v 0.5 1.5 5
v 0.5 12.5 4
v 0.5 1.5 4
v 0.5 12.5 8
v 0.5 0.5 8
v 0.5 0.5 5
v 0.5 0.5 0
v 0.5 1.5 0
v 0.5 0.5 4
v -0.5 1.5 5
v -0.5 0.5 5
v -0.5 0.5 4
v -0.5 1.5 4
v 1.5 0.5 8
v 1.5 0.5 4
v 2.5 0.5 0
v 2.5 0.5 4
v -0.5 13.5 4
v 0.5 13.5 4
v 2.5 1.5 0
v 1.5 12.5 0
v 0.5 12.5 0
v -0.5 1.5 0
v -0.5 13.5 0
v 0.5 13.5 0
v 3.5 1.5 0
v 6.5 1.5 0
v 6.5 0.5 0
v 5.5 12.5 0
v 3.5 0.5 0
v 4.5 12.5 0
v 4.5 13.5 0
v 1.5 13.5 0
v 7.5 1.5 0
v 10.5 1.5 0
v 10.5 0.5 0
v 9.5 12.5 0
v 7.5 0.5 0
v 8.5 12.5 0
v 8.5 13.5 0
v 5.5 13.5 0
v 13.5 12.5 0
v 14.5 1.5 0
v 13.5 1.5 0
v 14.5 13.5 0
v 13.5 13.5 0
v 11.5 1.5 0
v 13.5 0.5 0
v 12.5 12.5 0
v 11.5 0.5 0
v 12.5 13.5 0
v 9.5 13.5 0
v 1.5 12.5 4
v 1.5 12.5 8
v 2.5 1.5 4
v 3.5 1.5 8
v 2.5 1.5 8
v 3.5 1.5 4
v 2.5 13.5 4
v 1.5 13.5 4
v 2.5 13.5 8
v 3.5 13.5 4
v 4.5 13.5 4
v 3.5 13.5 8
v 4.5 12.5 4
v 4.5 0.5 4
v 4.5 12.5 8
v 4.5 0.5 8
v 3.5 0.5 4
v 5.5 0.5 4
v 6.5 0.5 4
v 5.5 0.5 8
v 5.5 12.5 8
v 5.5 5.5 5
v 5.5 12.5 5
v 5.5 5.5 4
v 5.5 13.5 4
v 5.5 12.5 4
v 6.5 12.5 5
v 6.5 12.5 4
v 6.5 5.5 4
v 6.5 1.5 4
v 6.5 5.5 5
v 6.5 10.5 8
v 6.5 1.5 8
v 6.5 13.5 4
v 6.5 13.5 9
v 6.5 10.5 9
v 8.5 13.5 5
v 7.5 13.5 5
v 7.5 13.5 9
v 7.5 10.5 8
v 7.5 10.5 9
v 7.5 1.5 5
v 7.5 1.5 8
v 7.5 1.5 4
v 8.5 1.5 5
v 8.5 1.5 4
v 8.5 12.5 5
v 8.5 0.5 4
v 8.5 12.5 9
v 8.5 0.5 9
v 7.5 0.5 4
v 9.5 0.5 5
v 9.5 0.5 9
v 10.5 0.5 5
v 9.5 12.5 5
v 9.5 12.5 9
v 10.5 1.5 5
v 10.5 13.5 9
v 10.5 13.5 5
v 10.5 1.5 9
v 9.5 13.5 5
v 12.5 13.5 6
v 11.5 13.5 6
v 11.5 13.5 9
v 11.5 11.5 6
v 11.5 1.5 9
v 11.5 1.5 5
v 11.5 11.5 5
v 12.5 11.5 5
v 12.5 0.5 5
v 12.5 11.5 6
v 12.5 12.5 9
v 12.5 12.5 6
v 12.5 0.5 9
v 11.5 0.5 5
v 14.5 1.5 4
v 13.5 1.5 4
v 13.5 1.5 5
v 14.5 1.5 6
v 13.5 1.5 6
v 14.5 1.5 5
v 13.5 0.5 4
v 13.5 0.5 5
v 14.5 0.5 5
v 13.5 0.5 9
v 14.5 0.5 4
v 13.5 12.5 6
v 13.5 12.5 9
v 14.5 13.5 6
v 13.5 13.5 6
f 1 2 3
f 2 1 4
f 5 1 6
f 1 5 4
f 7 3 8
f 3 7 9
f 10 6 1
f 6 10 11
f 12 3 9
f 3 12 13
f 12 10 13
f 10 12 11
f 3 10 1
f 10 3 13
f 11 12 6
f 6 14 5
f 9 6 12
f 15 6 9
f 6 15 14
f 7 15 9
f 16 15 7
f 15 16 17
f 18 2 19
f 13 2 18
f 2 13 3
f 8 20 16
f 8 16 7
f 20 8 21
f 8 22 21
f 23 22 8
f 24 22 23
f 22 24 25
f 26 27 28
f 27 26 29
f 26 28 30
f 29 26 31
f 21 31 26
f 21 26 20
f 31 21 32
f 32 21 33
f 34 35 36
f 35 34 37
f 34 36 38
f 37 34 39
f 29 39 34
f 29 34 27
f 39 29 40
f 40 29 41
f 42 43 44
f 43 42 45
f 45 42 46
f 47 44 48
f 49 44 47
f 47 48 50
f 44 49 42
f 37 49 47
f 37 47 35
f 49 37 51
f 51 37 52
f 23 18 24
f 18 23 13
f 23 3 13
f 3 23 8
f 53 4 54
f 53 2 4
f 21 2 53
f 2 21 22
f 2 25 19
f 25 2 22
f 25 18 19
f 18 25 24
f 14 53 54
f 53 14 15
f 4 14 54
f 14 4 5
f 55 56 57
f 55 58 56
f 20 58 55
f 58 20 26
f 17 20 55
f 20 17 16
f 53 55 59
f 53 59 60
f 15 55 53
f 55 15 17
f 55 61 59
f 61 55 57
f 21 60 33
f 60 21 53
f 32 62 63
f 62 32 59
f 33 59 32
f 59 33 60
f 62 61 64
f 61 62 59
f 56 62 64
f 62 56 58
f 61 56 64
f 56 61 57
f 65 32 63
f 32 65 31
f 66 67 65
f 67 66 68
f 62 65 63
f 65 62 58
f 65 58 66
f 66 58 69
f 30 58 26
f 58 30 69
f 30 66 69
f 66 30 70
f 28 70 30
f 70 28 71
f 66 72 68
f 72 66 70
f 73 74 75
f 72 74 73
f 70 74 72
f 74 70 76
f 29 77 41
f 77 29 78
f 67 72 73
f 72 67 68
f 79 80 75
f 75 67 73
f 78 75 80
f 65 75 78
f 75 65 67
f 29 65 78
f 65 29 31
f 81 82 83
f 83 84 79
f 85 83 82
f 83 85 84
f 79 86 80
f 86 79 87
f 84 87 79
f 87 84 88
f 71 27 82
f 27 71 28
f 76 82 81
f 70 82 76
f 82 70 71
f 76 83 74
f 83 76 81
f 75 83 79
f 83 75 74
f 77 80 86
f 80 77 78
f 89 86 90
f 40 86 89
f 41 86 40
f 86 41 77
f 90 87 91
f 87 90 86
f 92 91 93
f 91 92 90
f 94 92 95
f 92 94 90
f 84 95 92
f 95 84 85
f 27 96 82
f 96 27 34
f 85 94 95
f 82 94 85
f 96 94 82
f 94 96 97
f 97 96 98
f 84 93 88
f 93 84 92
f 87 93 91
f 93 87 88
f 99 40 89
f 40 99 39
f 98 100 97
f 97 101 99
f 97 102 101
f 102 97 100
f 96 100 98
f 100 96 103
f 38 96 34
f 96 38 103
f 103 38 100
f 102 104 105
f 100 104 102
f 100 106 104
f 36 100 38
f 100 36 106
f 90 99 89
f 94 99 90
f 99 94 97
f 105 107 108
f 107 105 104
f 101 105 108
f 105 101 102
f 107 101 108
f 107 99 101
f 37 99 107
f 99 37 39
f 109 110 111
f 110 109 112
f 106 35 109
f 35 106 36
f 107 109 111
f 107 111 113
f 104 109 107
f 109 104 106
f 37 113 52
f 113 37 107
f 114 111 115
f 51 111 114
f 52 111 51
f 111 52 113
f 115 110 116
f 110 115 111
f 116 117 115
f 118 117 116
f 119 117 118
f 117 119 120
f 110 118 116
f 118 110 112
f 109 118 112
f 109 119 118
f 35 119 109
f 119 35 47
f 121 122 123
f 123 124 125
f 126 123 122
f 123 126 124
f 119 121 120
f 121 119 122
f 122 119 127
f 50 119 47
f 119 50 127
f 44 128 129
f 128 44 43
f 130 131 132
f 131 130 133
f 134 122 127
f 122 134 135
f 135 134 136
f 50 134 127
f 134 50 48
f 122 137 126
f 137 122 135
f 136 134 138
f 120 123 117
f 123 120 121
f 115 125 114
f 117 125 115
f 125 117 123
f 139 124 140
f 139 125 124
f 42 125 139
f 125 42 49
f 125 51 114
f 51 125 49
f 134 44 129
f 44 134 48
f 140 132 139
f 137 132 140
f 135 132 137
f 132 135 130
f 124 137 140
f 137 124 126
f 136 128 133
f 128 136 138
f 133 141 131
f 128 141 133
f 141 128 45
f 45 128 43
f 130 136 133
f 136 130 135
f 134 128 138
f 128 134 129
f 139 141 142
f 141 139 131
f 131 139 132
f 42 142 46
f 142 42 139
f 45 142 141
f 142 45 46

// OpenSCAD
union() {
    translate([0, 1, 4.5]) color([1, 0, 0]) cube([1, 1, 1], center=true);
    translate([0, 2, 2.0]) cube([1, 1, 4], center=true);
    translate([0, 3, 2.0]) cube([1, 1, 4], center=true);
    translate([0, 4, 2.0]) cube([1, 1, 4], center=true);
    translate([0, 5, 2.0]) cube([1, 1, 4], center=true);
    translate([0, 6, 2.0]) cube([1, 1, 4], center=true);
    translate([0, 7, 2.0]) cube([1, 1, 4], center=true);
    translate([0, 8, 2.0]) cube([1, 1, 4], center=true);
    translate([0, 9, 2.0]) cube([1, 1, 4], center=true);
    translate([0, 10, 2.0]) cube([1, 1, 4], center=true);
    translate([0, 11, 2.0]) cube([1, 1, 4], center=true);
    translate([0, 12, 2.0]) cube([1, 1, 4], center=true);
    translate([0, 13, 2.0]) cube([1, 1, 4], center=true);
    translate([1, 1, 4.0]) cube([1, 1, 8], center=true);
    translate([1, 2, 4.0]) cube([1, 1, 8], center=true);
    translate([1, 3, 4.0]) cube([1, 1, 8], center=true);
    translate([1, 4, 4.0]) cube([1, 1, 8], center=true);
    translate([1, 5, 4.0]) cube([1, 1, 8], center=true);
    translate([1, 6, 4.0]) cube([1, 1, 8], center=true);
    translate([1, 7, 4.0]) cube([1, 1, 8], center=true);
    translate([1, 8, 4.0]) cube([1, 1, 8], center=true);
    translate([1, 9, 4.0]) cube([1, 1, 8], center=true);
    translate([1, 10, 4.0]) cube([1, 1, 8], center=true);
    translate([1, 11, 4.0]) cube([1, 1, 8], center=true);
    translate([1, 12, 4.0]) cube([1, 1, 8], center=true);
    translate([2, 1, 2.0]) cube([1, 1, 4], center=true);
    translate([2, 2, 2.0]) cube([1, 1, 4], center=true);
    translate([2, 3, 2.0]) cube([1, 1, 4], center=true);
    translate([2, 4, 2.0]) cube([1, 1, 4], center=true);
    translate([2, 5, 2.0]) cube([1, 1, 4], center=true);
    translate([2, 6, 2.0]) cube([1, 1, 4], center=true);
    translate([2, 7, 2.0]) cube([1, 1, 4], center=true);
    translate([2, 8, 2.0]) cube([1, 1, 4], center=true);
    translate([2, 9, 2.0]) cube([1, 1, 4], center=true);
    translate([2, 10, 2.0]) cube([1, 1, 4], center=true);
    translate([2, 11, 2.0]) cube([1, 1, 4], center=true);
    translate([2, 12, 2.0]) cube([1, 1, 4], center=true);
    translate([2, 13, 2.0]) cube([1, 1, 4], center=true);
    translate([3, 2, 4.0]) cube([1, 1, 8], center=true);
    translate([3, 3, 4.0]) cube([1, 1, 8], center=true);
    translate([3, 4, 4.0]) cube([1, 1, 8], center=true);
    translate([3, 5, 4.0]) cube([1, 1, 8], center=true);
    translate([3, 6, 4.0]) cube([1, 1, 8], center=true);
    translate([3, 7, 4.0]) cube([1, 1, 8], center=true);
    translate([3, 8, 4.0]) cube([1, 1, 8], center=true);
    translate([3, 9, 4.0]) cube([1, 1, 8], center=true);
    translate([3, 10, 4.0]) cube([1, 1, 8], center=true);
    translate([3, 11, 4.0]) cube([1, 1, 8], center=true);
    translate([3, 12, 4.0]) cube([1, 1, 8], center=true);
    translate([3, 13, 4.0]) cube([1, 1, 8], center=true);
    translate([4, 1, 2.0]) cube([1, 1, 4], center=true);
    translate([4, 2, 2.0]) cube([1, 1, 4], center=true);
    translate([4, 3, 2.0]) cube([1, 1, 4], center=true);
    translate([4, 4, 2.0]) cube([1, 1, 4], center=true);
    translate([4, 5, 2.0]) cube([1, 1, 4], center=true);
    translate([4, 6, 2.0]) cube([1, 1, 4], center=true);
    translate([4, 7, 2.0]) cube([1, 1, 4], center=true);
    translate([4, 8, 2.0]) cube([1, 1, 4], center=true);
    translate([4, 9, 2.0]) cube([1, 1, 4], center=true);
    translate([4, 10, 2.0]) cube([1, 1, 4], center=true);
    translate([4, 11, 2.0]) cube([1, 1, 4], center=true);
    translate([4, 12, 2.0]) cube([1, 1, 4], center=true);
    translate([4, 13, 2.0]) cube([1, 1, 4], center=true);
    translate([5, 1, 4.0]) cube([1, 1, 8], center=true);
    translate([5, 2, 4.0]) cube([1, 1, 8], center=true);
    translate([5, 3, 4.0]) cube([1, 1, 8], center=true);
    translate([5, 4, 4.0]) cube([1, 1, 8], center=true);
    translate([5, 5, 4.0]) cube([1, 1, 8], center=true);
    translate([5, 6, 4.0]) cube([1, 1, 8], center=true);
    translate([5, 7, 4.0]) cube([1, 1, 8], center=true);
    translate([5, 8, 4.0]) cube([1, 1, 8], center=true);
    translate([5, 9, 4.0]) cube([1, 1, 8], center=true);
    translate([5, 10, 4.0]) cube([1, 1, 8], center=true);
    translate([5, 11, 4.0]) cube([1, 1, 8], center=true);
    translate([5, 12, 4.0]) cube([1, 1, 8], center=true);
    translate([6, 1, 2.0]) cube([1, 1, 4], center=true);
    translate([6, 2, 2.0]) cube([1, 1, 4], center=true);
    translate([6, 3, 2.0]) cube([1, 1, 4], center=true);
    translate([6, 4, 2.0]) cube([1, 1, 4], center=true);
    translate([6, 5, 2.0]) cube([1, 1, 4], center=true);
    translate([6, 6, 2.5]) cube([1, 1, 5], center=true);
    translate([6, 7, 2.5]) cube([1, 1, 5], center=true);
    translate([6, 8, 2.5]) cube([1, 1, 5], center=true);
    translate([6, 9, 2.5]) cube([1, 1, 5], center=true);
    translate([6, 10, 2.5]) cube([1, 1, 5], center=true);
    translate([6, 11, 2.5]) cube([1, 1, 5], center=true);
    translate([6, 12, 2.5]) cube([1, 1, 5], center=true);
    translate([6, 13, 2.0]) cube([1, 1, 4], center=true);
    translate([7, 2, 4.0]) cube([1, 1, 8], center=true);
    translate([7, 3, 4.0]) cube([1, 1, 8], center=true);
    translate([7, 4, 4.0]) cube([1, 1, 8], center=true);
    translate([7, 5, 4.0]) cube([1, 1, 8], center=true);
    translate([7, 6, 4.0]) cube([1, 1, 8], center=true);
    translate([7, 7, 4.0]) cube([1, 1, 8], center=true);
    translate([7, 8, 4.0]) cube([1, 1, 8], center=true);
    translate([7, 9, 4.0]) cube([1, 1, 8], center=true);
    translate([7, 10, 4.0]) cube([1, 1, 8], center=true);
    translate([7, 11, 4.5]) cube([1, 1, 9], center=true);
    translate([7, 12, 4.5]) cube([1, 1, 9], center=true);
    translate([7, 13, 4.5]) cube([1, 1, 9], center=true);
    translate([8, 1, 2.0]) cube([1, 1, 4], center=true);
    translate([8, 2, 2.5]) cube([1, 1, 5], center=true);
    translate([8, 3, 2.5]) cube([1, 1, 5], center=true);
    translate([8, 4, 2.5]) cube([1, 1, 5], center=true);
    translate([8, 5, 2.5]) cube([1, 1, 5], center=true);
    translate([8, 6, 2.5]) cube([1, 1, 5], center=true);
    translate([8, 7, 2.5]) cube([1, 1, 5], center=true);
    translate([8, 8, 2.5]) cube([1, 1, 5], center=true);
    translate([8, 9, 2.5]) cube([1, 1, 5], center=true);
    translate([8, 10, 2.5]) cube([1, 1, 5], center=true);
    translate([8, 11, 2.5]) cube([1, 1, 5], center=true);
    translate([8, 12, 2.5]) cube([1, 1, 5], center=true);
    translate([8, 13, 2.5]) cube([1, 1, 5], center=true);
    translate([9, 1, 4.5]) cube([1, 1, 9], center=true);
    translate([9, 2, 4.5]) cube([1, 1, 9], center=true);
    translate([9, 3, 4.5]) cube([1, 1, 9], center=true);
    translate([9, 4, 4.5]) cube([1, 1, 9], center=true);
    translate([9, 5, 4.5]) cube([1, 1, 9], center=true);
    translate([9, 6, 4.5]) cube([1, 1, 9], center=true);
    translate([9, 7, 4.5]) cube([1, 1, 9], center=true);
    translate([9, 8, 4.5]) cube([1, 1, 9], center=true);
    translate([9, 9, 4.5]) cube([1, 1, 9], center=true);
    translate([9, 10, 4.5]) cube([1, 1, 9], center=true);
    translate([9, 11, 4.5]) cube([1, 1, 9], center=true);
    translate([9, 12, 4.5]) cube([1, 1, 9], center=true);
    translate([10, 1, 2.5]) cube([1, 1, 5], center=true);
    translate([10, 2, 2.5]) cube([1, 1, 5], center=true);
    translate([10, 3, 2.5]) cube([1, 1, 5], center=true);
    translate([10, 4, 2.5]) cube([1, 1, 5], center=true);
    translate([10, 5, 2.5]) cube([1, 1, 5], center=true);
    translate([10, 6, 2.5]) cube([1, 1, 5], center=true);
    translate([10, 7, 2.5]) cube([1, 1, 5], center=true);
    translate([10, 8, 2.5]) cube([1, 1, 5], center=true);
    translate([10, 9, 2.5]) cube([1, 1, 5], center=true);
    translate([10, 10, 2.5]) cube([1, 1, 5], center=true);
    translate([10, 11, 2.5]) cube([1, 1, 5], center=true);
    translate([10, 12, 2.5]) cube([1, 1, 5], center=true);
    translate([10, 13, 2.5]) cube([1, 1, 5], center=true);
    translate([11, 2, 4.5]) cube([1, 1, 9], center=true);
    translate([11, 3, 4.5]) cube([1, 1, 9], center=true);
    translate([11, 4, 4.5]) cube([1, 1, 9], center=true);
    translate([11, 5, 4.5]) cube([1, 1, 9], center=true);
    translate([11, 6, 4.5]) cube([1, 1, 9], center=true);
    translate([11, 7, 4.5]) cube([1, 1, 9], center=true);
    translate([11, 8, 4.5]) cube([1, 1, 9], center=true);
    translate([11, 9, 4.5]) cube([1, 1, 9], center=true);
    translate([11, 10, 4.5]) cube([1, 1, 9], center=true);
    translate([11, 11, 4.5]) cube([1, 1, 9], center=true);
    translate([11, 12, 4.5]) cube([1, 1, 9], center=true);
    translate([11, 13, 4.5]) cube([1, 1, 9], center=true);
    translate([12, 1, 2.5]) cube([1, 1, 5], center=true);
    translate([12, 2, 2.5]) cube([1, 1, 5], center=true);
    translate([12, 3, 2.5]) cube([1, 1, 5], center=true);
    translate([12, 4, 2.5]) cube([1, 1, 5], center=true);
    translate([12, 5, 2.5]) cube([1, 1, 5], center=true);
    translate([12, 6, 2.5]) cube([1, 1, 5], center=true);
    translate([12, 7, 2.5]) cube([1, 1, 5], center=true);
    translate([12, 8, 2.5]) cube([1, 1, 5], center=true);
    translate([12, 9, 2.5]) cube([1, 1, 5], center=true);
    translate([12, 10, 2.5]) cube([1, 1, 5], center=true);
    translate([12, 11, 2.5]) cube([1, 1, 5], center=true);
    translate([12, 12, 3.0]) cube([1, 1, 6], center=true);
    translate([12, 13, 3.0]) cube([1, 1, 6], center=true);
    translate([13, 1, 4.5]) cube([1, 1, 9], center=true);
    translate([13, 2, 4.5]) cube([1, 1, 9], center=true);
    translate([13, 3, 4.5]) cube([1, 1, 9], center=true);
    translate([13, 4, 4.5]) cube([1, 1, 9], center=true);
    translate([13, 5, 4.5]) cube([1, 1, 9], center=true);
    translate([13, 6, 4.5]) cube([1, 1, 9], center=true);
    translate([13, 7, 4.5]) cube([1, 1, 9], center=true);
    translate([13, 8, 4.5]) cube([1, 1, 9], center=true);
    translate([13, 9, 4.5]) cube([1, 1, 9], center=true);
    translate([13, 10, 4.5]) cube([1, 1, 9], center=true);
    translate([13, 11, 4.5]) cube([1, 1, 9], center=true);
    translate([13, 12, 4.5]) cube([1, 1, 9], center=true);
    translate([14, 1, 4.5]) color([0, 0, 1]) cube([1, 1, 1], center=true);
    translate([14, 2, 3.0]) cube([1, 1, 6], center=true);
    translate([14, 3, 3.0]) cube([1, 1, 6], center=true);
    translate([14, 4, 3.0]) cube([1, 1, 6], center=true);
    translate([14, 5, 3.0]) cube([1, 1, 6], center=true);
    translate([14, 6, 3.0]) cube([1, 1, 6], center=true);
    translate([14, 7, 3.0]) cube([1, 1, 6], center=true);
    translate([14, 8, 3.0]) cube([1, 1, 6], center=true);
    translate([14, 9, 3.0]) cube([1, 1, 6], center=true);
    translate([14, 10, 3.0]) cube([1, 1, 6], center=true);
    translate([14, 11, 3.0]) cube([1, 1, 6], center=true);
    translate([14, 12, 3.0]) cube([1, 1, 6], center=true);
    translate([14, 13, 3.0]) cube([1, 1, 6], center=true);
}
